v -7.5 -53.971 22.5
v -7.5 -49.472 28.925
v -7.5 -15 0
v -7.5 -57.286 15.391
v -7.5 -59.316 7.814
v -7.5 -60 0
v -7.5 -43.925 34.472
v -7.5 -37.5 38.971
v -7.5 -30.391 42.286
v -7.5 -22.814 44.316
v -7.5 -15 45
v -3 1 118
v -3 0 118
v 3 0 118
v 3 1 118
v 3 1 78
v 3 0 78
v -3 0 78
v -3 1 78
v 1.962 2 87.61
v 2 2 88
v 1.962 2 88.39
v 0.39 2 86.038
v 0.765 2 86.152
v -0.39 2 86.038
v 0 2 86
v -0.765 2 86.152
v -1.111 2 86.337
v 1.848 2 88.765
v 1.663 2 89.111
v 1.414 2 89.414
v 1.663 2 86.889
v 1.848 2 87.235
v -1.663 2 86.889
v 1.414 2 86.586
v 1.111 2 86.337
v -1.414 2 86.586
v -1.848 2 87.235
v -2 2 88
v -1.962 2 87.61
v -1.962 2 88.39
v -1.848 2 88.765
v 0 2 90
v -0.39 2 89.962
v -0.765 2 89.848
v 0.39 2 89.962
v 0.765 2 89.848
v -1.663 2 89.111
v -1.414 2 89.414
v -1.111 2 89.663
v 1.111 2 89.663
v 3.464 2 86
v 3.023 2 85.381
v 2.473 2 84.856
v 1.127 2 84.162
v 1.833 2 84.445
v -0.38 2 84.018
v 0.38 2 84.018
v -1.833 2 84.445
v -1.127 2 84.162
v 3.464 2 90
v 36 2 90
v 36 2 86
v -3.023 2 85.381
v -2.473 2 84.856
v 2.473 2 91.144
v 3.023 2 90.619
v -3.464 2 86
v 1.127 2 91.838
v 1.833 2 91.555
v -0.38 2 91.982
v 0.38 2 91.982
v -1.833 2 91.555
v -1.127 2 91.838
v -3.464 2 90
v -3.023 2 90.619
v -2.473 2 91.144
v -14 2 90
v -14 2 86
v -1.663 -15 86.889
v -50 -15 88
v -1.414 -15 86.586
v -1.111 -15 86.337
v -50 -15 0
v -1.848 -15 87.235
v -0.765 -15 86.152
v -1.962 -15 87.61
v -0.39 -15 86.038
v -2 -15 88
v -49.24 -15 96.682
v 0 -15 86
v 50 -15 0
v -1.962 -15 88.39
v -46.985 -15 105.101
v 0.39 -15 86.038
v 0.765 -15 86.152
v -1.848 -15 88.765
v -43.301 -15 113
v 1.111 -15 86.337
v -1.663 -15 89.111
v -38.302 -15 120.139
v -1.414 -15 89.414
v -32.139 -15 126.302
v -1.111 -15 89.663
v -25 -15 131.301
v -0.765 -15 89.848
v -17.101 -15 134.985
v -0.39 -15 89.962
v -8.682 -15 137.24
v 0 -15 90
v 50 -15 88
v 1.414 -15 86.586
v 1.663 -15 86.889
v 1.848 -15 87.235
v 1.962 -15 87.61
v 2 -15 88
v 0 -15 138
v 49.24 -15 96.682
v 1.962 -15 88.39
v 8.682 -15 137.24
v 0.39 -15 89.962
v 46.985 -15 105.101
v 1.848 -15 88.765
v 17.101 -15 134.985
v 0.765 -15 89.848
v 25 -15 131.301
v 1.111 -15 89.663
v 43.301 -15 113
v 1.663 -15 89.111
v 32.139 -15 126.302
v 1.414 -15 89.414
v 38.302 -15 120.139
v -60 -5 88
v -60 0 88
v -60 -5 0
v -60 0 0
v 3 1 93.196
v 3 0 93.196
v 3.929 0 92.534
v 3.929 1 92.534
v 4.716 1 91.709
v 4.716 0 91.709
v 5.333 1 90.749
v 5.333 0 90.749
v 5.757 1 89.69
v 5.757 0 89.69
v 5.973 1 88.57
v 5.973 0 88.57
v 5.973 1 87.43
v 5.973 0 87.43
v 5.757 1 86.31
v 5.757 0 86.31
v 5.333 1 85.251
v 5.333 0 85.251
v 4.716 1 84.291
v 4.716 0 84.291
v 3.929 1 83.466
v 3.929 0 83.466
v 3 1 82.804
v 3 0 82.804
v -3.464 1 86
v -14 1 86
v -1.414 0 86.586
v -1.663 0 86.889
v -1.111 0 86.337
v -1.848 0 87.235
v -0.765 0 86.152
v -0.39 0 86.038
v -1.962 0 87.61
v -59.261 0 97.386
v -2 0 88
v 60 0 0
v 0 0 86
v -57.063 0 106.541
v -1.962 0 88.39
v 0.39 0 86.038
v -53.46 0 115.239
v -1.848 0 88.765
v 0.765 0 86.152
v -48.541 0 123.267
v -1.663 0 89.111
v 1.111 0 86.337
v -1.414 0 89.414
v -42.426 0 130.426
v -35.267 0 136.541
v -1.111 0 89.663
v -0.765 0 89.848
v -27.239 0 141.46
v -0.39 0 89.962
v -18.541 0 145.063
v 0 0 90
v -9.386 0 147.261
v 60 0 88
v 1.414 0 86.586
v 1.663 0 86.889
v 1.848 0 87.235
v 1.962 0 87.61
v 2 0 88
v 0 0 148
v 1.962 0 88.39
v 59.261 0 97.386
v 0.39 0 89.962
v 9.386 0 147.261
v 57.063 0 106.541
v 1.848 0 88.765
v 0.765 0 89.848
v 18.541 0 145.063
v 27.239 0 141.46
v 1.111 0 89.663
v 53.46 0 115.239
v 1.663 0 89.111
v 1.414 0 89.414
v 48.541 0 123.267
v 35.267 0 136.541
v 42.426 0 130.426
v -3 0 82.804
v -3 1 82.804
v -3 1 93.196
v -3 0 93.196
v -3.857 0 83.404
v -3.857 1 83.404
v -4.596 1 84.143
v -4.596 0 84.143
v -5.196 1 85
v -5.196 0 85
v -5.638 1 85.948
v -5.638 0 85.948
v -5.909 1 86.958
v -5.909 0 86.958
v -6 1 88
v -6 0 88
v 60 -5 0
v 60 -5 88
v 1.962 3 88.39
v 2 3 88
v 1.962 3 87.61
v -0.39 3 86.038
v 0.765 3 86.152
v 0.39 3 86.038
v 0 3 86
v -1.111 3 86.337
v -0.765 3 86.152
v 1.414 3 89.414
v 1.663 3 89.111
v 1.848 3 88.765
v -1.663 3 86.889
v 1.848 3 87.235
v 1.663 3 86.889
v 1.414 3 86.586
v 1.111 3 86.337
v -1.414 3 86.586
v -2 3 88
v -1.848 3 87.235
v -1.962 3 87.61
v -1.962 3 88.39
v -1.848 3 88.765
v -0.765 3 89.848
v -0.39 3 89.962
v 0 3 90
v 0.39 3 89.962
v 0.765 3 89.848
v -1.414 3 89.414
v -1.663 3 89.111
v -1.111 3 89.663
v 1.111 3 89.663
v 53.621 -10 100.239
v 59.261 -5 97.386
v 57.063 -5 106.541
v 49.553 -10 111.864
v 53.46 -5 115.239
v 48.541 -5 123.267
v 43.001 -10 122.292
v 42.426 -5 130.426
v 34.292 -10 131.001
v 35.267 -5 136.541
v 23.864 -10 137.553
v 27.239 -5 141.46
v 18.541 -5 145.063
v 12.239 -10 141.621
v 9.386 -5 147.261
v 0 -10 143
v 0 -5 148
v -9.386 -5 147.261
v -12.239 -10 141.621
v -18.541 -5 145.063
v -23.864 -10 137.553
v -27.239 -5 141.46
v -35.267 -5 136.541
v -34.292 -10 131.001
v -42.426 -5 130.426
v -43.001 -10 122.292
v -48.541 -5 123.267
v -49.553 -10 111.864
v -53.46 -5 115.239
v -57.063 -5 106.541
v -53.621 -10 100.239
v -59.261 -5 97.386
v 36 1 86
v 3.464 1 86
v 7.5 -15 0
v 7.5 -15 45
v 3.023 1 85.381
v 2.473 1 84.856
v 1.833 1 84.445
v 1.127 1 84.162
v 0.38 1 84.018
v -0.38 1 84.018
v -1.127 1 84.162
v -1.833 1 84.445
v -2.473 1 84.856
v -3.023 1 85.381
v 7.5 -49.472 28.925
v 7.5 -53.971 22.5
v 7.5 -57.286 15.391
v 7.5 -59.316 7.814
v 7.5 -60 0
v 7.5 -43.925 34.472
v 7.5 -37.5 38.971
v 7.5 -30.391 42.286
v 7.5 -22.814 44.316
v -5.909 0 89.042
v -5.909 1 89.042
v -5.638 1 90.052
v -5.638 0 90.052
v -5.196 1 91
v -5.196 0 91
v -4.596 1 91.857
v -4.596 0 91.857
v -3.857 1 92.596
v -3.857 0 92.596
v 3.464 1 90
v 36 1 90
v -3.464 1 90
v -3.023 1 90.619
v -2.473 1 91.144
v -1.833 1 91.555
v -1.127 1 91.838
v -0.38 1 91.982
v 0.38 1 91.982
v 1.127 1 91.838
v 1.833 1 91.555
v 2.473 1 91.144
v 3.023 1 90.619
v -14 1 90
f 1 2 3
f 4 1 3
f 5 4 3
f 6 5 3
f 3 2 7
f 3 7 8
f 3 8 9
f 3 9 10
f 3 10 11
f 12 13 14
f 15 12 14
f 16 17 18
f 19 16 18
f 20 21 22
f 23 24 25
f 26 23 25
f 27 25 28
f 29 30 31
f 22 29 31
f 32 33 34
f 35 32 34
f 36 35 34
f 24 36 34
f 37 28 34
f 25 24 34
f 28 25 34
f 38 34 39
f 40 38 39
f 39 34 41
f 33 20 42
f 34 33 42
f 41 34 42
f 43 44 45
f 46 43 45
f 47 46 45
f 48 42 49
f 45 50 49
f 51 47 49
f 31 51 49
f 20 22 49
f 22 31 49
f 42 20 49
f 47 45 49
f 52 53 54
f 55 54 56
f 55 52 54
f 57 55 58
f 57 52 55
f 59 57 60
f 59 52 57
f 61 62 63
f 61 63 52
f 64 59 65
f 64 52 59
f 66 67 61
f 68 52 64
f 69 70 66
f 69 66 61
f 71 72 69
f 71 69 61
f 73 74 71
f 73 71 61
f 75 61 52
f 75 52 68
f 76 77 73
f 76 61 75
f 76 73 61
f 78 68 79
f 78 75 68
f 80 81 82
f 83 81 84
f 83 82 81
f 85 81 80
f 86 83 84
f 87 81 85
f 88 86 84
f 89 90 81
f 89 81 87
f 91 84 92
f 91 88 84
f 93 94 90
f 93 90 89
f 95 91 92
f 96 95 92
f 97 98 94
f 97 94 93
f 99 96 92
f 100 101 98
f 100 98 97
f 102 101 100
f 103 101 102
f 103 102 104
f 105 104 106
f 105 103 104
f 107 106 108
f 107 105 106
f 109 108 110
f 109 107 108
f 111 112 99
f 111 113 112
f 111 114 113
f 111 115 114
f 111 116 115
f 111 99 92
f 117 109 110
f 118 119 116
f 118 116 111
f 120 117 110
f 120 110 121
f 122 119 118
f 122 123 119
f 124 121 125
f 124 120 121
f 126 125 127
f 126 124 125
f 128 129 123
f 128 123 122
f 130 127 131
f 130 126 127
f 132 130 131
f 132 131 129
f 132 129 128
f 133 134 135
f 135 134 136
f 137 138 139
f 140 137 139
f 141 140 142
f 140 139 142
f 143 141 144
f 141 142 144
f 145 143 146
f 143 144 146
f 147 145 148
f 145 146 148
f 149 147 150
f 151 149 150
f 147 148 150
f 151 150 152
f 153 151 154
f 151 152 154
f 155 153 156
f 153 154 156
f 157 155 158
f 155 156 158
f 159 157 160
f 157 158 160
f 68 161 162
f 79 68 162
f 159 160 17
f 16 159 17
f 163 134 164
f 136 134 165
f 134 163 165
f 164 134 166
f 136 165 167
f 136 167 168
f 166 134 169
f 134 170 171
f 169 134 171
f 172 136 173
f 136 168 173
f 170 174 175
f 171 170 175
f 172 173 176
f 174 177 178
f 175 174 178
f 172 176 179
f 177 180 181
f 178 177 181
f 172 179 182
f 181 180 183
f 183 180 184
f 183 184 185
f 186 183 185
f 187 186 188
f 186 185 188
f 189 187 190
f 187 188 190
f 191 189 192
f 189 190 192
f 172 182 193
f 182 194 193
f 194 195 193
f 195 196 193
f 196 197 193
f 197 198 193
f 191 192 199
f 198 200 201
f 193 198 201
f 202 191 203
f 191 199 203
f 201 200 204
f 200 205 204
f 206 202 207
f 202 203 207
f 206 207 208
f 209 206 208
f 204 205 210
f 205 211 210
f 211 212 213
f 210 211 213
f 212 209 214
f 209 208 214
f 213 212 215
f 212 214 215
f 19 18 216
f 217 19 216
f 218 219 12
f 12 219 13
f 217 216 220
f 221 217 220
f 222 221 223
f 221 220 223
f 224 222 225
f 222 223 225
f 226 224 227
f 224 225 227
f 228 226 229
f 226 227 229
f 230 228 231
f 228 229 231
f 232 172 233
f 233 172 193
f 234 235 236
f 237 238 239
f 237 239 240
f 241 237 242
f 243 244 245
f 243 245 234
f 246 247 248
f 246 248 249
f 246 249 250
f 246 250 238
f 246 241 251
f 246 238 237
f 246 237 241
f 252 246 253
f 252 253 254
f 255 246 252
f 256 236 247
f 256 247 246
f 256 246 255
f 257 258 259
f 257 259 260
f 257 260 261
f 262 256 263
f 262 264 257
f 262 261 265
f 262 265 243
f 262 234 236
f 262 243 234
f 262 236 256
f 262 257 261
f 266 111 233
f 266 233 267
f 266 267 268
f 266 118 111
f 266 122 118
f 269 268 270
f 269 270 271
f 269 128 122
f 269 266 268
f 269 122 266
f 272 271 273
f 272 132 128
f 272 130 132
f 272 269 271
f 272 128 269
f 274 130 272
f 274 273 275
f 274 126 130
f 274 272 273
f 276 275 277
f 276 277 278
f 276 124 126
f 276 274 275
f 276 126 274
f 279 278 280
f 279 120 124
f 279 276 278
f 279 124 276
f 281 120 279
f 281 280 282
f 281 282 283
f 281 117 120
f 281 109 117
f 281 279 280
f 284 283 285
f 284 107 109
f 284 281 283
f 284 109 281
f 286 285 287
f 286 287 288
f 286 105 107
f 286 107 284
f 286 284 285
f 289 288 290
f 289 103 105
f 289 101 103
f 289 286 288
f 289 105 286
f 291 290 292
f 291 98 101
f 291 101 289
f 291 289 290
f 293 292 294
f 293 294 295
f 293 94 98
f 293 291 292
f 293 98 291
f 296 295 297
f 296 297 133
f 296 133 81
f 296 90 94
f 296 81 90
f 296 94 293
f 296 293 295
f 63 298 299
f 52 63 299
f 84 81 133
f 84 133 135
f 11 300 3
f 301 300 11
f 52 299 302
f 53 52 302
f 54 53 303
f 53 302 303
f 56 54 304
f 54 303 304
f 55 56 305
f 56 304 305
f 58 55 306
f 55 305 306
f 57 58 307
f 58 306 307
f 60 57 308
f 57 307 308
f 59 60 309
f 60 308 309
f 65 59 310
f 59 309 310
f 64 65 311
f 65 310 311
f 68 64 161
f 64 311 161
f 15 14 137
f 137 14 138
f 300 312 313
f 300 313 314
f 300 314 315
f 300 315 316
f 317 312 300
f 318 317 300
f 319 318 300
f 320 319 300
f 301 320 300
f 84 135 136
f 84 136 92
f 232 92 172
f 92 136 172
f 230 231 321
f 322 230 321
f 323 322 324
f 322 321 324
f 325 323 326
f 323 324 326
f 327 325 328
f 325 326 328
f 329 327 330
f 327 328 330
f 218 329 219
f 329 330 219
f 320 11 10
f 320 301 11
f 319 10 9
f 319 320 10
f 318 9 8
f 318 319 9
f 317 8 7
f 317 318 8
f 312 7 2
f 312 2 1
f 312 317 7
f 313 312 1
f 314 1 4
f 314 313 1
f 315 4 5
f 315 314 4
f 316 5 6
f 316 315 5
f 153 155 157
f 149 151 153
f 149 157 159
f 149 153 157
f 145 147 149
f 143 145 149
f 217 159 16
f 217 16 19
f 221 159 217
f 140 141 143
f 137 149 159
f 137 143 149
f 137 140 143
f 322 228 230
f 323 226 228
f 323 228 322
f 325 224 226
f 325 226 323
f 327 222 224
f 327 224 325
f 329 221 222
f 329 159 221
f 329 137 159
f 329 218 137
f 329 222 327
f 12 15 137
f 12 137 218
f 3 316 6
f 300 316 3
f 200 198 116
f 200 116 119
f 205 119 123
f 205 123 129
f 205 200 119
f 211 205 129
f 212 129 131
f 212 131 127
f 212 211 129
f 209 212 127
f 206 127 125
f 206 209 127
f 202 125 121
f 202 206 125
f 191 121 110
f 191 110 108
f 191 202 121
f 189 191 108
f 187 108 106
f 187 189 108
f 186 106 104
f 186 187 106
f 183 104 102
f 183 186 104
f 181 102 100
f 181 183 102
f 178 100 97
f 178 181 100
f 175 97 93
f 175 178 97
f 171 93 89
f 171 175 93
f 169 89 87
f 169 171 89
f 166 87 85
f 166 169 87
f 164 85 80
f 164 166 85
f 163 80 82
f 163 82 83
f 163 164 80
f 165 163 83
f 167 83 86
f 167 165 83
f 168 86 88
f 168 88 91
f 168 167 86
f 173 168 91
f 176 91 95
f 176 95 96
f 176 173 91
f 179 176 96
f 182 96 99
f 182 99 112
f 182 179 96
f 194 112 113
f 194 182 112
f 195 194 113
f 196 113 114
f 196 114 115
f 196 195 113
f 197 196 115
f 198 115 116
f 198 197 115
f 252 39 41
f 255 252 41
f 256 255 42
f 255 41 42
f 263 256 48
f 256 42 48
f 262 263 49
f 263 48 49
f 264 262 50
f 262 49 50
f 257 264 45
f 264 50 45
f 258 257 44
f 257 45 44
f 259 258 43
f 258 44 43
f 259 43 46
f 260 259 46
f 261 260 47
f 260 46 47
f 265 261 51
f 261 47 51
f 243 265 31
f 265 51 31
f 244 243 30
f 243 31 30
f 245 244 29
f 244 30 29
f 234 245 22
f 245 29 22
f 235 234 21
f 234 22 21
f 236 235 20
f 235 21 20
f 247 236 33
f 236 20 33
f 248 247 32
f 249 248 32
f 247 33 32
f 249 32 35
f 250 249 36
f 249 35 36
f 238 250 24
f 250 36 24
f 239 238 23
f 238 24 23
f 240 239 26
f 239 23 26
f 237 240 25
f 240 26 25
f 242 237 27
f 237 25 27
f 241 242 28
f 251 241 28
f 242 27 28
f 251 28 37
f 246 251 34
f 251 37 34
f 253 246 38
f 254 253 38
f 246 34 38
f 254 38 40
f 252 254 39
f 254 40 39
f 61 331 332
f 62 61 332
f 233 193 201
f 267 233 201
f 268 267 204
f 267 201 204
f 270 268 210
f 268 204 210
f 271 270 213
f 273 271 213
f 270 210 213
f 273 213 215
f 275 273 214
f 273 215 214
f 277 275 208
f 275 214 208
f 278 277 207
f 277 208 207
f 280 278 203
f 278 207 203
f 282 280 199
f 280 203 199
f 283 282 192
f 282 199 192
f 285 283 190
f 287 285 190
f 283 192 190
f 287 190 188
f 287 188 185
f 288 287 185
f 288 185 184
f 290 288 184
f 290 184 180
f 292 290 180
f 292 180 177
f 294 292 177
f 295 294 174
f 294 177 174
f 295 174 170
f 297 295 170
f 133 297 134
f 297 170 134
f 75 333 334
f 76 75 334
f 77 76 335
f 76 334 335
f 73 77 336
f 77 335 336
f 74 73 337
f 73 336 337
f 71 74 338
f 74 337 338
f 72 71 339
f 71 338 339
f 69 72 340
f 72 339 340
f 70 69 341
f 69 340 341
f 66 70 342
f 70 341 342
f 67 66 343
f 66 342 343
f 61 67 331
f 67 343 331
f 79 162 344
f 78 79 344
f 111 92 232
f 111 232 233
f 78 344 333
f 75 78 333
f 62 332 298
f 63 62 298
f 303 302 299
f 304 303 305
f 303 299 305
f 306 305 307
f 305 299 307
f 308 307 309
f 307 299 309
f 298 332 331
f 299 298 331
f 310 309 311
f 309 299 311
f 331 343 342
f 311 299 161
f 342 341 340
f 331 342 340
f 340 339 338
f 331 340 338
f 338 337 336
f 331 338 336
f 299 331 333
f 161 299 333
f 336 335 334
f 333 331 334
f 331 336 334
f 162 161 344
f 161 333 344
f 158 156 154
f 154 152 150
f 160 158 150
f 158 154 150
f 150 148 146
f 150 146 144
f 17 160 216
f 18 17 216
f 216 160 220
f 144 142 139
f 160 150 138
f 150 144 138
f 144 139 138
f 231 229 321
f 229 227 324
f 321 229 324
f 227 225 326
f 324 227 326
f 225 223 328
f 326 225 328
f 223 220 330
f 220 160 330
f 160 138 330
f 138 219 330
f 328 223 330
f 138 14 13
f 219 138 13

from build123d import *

# Parameters (mm, degrees)
F0_R      = 2
F1_DEPTH  = 15
F4_DEPTH  = 1
F6_DEPTH  = 1
F7_R      = 2
F8_DEPTH  = 1
F9_SIZE   = 10
F11_DEPTH = 7.5


with BuildPart() as f1:
    # F0 (on Front) → F1 (new body)
    with BuildSketch(Plane.XZ):
        with BuildLine():
            Line((-60, 88), (-60, 0))
            Line((-60, 0), (60, 0))
            Line((60, 0), (60, 88))
            ThreePointArc((60, 88), (0, 148), (-60, 88))
        make_face()
        with Locations((0, 88)):
            Circle(F0_R, mode=Mode.SUBTRACT)
    extrude(amount=F1_DEPTH)

    # F9
    f9_edges = [f1.edges().sort_by_distance(p)[0] for p in [
        (0, -15, 148),
    ]]
    chamfer(f9_edges, length=F9_SIZE)


with BuildPart() as f4:
    # F3 (on face) → F4 (new body)
    with BuildSketch(Plane(origin=(0, 0, 0), x_dir=(-1, 0, 0), z_dir=(0, 1, 0))):
        with BuildLine():
            ThreePointArc((3, 82.8038475773), (5.1961524227, 85), (6, 88))
            ThreePointArc((6, 88), (5.1961524227, 91), (3, 93.1961524227))
            Line((3, 93.1961524227), (3, 82.8038475773))
        make_face()
        with BuildLine():
            Line((3, 82.8038475773), (3, 93.1961524227))
            ThreePointArc((3, 93.1961524227), (0, 94), (-3, 93.1961524227))
            Line((-3, 93.1961524227), (-3, 82.8038475773))
            ThreePointArc((-3, 82.8038475773), (0, 82), (3, 82.8038475773))
        make_face()
        with BuildLine():
            ThreePointArc((-3, 93.1961524227), (0, 94), (3, 93.1961524227))
            Line((3, 93.1961524227), (3, 118))
            Line((3, 118), (-3, 118))
            Line((-3, 118), (-3, 93.1961524227))
        make_face()
        with BuildLine():
            Line((3, 78), (3, 82.8038475773))
            ThreePointArc((3, 82.8038475773), (0, 82), (-3, 82.8038475773))
            Line((-3, 82.8038475773), (-3, 78))
            Line((-3, 78), (3, 78))
        make_face()
        with BuildLine():
            Line((-3, 82.8038475773), (-3, 93.1961524227))
            ThreePointArc((-3, 93.1961524227), (-6, 88), (-3, 82.8038475773))
        make_face()
    extrude(amount=F4_DEPTH)


with BuildPart() as f6:
    # F5 (on face) → F6 (new body)
    with BuildSketch(Plane(origin=(0, 1, 0), x_dir=(-1, 0, 0), z_dir=(0, 1, 0))):
        with BuildLine():
            ThreePointArc((3.4641016151, 86), (3.8637033052, 86.9647238196), (4, 88))
            ThreePointArc((4, 88), (3.8637033052, 89.0352761804), (3.4641016151, 90))
            Line((3.4641016151, 90), (-3.4641016151, 90))
            ThreePointArc((-3.4641016151, 90), (-4, 88), (-3.4641016151, 86))
            Line((-3.4641016151, 86), (3.4641016151, 86))
        make_face()
        with BuildLine():
            ThreePointArc((3.4641016151, 90), (3.8637033052, 89.0352761804), (4, 88))
            ThreePointArc((4, 88), (3.8637033052, 86.9647238196), (3.4641016151, 86))
            Line((3.4641016151, 86), (14, 86))
            Line((14, 86), (14, 90))
            Line((14, 90), (3.4641016151, 90))
        make_face()
        with BuildLine():
            Line((-3.4641016151, 90), (3.4641016151, 90))
            ThreePointArc((3.4641016151, 90), (0, 92), (-3.4641016151, 90))
        make_face()
        with BuildLine():
            ThreePointArc((-3.4641016151, 86), (0, 84), (3.4641016151, 86))
            Line((3.4641016151, 86), (-3.4641016151, 86))
        make_face()
        with BuildLine():
            ThreePointArc((-3.4641016151, 86), (-4, 88), (-3.4641016151, 90))
            Line((-3.4641016151, 90), (-36, 90))
            Line((-36, 90), (-36, 86))
            Line((-36, 86), (-3.4641016151, 86))
        make_face()
    extrude(amount=F6_DEPTH)


with BuildPart() as f8:
    # F7 (on face) → F8 (new body)
    with BuildSketch(Plane(origin=(0, 2, 0), x_dir=(-1, 0, 0), z_dir=(0, 1, 0))):
        with Locations((0, 88)):
            Circle(F7_R)
    extrude(amount=F8_DEPTH)


with BuildPart() as f11:
    # F10 (on Right) → F11 (new body, symmetric)
    with BuildSketch(Plane.YZ):
        with BuildLine():
            Line((-60, 0), (-15, 0))
            Line((-15, 0), (-15, 45))
            ThreePointArc((-15, 45), (-46.8198051534, 31.8198051534), (-60, 0))
        make_face()
    extrude(amount=F11_DEPTH, both=True)


solid = Compound([f1.part, f4.part, f6.part, f8.part, f11.part])
